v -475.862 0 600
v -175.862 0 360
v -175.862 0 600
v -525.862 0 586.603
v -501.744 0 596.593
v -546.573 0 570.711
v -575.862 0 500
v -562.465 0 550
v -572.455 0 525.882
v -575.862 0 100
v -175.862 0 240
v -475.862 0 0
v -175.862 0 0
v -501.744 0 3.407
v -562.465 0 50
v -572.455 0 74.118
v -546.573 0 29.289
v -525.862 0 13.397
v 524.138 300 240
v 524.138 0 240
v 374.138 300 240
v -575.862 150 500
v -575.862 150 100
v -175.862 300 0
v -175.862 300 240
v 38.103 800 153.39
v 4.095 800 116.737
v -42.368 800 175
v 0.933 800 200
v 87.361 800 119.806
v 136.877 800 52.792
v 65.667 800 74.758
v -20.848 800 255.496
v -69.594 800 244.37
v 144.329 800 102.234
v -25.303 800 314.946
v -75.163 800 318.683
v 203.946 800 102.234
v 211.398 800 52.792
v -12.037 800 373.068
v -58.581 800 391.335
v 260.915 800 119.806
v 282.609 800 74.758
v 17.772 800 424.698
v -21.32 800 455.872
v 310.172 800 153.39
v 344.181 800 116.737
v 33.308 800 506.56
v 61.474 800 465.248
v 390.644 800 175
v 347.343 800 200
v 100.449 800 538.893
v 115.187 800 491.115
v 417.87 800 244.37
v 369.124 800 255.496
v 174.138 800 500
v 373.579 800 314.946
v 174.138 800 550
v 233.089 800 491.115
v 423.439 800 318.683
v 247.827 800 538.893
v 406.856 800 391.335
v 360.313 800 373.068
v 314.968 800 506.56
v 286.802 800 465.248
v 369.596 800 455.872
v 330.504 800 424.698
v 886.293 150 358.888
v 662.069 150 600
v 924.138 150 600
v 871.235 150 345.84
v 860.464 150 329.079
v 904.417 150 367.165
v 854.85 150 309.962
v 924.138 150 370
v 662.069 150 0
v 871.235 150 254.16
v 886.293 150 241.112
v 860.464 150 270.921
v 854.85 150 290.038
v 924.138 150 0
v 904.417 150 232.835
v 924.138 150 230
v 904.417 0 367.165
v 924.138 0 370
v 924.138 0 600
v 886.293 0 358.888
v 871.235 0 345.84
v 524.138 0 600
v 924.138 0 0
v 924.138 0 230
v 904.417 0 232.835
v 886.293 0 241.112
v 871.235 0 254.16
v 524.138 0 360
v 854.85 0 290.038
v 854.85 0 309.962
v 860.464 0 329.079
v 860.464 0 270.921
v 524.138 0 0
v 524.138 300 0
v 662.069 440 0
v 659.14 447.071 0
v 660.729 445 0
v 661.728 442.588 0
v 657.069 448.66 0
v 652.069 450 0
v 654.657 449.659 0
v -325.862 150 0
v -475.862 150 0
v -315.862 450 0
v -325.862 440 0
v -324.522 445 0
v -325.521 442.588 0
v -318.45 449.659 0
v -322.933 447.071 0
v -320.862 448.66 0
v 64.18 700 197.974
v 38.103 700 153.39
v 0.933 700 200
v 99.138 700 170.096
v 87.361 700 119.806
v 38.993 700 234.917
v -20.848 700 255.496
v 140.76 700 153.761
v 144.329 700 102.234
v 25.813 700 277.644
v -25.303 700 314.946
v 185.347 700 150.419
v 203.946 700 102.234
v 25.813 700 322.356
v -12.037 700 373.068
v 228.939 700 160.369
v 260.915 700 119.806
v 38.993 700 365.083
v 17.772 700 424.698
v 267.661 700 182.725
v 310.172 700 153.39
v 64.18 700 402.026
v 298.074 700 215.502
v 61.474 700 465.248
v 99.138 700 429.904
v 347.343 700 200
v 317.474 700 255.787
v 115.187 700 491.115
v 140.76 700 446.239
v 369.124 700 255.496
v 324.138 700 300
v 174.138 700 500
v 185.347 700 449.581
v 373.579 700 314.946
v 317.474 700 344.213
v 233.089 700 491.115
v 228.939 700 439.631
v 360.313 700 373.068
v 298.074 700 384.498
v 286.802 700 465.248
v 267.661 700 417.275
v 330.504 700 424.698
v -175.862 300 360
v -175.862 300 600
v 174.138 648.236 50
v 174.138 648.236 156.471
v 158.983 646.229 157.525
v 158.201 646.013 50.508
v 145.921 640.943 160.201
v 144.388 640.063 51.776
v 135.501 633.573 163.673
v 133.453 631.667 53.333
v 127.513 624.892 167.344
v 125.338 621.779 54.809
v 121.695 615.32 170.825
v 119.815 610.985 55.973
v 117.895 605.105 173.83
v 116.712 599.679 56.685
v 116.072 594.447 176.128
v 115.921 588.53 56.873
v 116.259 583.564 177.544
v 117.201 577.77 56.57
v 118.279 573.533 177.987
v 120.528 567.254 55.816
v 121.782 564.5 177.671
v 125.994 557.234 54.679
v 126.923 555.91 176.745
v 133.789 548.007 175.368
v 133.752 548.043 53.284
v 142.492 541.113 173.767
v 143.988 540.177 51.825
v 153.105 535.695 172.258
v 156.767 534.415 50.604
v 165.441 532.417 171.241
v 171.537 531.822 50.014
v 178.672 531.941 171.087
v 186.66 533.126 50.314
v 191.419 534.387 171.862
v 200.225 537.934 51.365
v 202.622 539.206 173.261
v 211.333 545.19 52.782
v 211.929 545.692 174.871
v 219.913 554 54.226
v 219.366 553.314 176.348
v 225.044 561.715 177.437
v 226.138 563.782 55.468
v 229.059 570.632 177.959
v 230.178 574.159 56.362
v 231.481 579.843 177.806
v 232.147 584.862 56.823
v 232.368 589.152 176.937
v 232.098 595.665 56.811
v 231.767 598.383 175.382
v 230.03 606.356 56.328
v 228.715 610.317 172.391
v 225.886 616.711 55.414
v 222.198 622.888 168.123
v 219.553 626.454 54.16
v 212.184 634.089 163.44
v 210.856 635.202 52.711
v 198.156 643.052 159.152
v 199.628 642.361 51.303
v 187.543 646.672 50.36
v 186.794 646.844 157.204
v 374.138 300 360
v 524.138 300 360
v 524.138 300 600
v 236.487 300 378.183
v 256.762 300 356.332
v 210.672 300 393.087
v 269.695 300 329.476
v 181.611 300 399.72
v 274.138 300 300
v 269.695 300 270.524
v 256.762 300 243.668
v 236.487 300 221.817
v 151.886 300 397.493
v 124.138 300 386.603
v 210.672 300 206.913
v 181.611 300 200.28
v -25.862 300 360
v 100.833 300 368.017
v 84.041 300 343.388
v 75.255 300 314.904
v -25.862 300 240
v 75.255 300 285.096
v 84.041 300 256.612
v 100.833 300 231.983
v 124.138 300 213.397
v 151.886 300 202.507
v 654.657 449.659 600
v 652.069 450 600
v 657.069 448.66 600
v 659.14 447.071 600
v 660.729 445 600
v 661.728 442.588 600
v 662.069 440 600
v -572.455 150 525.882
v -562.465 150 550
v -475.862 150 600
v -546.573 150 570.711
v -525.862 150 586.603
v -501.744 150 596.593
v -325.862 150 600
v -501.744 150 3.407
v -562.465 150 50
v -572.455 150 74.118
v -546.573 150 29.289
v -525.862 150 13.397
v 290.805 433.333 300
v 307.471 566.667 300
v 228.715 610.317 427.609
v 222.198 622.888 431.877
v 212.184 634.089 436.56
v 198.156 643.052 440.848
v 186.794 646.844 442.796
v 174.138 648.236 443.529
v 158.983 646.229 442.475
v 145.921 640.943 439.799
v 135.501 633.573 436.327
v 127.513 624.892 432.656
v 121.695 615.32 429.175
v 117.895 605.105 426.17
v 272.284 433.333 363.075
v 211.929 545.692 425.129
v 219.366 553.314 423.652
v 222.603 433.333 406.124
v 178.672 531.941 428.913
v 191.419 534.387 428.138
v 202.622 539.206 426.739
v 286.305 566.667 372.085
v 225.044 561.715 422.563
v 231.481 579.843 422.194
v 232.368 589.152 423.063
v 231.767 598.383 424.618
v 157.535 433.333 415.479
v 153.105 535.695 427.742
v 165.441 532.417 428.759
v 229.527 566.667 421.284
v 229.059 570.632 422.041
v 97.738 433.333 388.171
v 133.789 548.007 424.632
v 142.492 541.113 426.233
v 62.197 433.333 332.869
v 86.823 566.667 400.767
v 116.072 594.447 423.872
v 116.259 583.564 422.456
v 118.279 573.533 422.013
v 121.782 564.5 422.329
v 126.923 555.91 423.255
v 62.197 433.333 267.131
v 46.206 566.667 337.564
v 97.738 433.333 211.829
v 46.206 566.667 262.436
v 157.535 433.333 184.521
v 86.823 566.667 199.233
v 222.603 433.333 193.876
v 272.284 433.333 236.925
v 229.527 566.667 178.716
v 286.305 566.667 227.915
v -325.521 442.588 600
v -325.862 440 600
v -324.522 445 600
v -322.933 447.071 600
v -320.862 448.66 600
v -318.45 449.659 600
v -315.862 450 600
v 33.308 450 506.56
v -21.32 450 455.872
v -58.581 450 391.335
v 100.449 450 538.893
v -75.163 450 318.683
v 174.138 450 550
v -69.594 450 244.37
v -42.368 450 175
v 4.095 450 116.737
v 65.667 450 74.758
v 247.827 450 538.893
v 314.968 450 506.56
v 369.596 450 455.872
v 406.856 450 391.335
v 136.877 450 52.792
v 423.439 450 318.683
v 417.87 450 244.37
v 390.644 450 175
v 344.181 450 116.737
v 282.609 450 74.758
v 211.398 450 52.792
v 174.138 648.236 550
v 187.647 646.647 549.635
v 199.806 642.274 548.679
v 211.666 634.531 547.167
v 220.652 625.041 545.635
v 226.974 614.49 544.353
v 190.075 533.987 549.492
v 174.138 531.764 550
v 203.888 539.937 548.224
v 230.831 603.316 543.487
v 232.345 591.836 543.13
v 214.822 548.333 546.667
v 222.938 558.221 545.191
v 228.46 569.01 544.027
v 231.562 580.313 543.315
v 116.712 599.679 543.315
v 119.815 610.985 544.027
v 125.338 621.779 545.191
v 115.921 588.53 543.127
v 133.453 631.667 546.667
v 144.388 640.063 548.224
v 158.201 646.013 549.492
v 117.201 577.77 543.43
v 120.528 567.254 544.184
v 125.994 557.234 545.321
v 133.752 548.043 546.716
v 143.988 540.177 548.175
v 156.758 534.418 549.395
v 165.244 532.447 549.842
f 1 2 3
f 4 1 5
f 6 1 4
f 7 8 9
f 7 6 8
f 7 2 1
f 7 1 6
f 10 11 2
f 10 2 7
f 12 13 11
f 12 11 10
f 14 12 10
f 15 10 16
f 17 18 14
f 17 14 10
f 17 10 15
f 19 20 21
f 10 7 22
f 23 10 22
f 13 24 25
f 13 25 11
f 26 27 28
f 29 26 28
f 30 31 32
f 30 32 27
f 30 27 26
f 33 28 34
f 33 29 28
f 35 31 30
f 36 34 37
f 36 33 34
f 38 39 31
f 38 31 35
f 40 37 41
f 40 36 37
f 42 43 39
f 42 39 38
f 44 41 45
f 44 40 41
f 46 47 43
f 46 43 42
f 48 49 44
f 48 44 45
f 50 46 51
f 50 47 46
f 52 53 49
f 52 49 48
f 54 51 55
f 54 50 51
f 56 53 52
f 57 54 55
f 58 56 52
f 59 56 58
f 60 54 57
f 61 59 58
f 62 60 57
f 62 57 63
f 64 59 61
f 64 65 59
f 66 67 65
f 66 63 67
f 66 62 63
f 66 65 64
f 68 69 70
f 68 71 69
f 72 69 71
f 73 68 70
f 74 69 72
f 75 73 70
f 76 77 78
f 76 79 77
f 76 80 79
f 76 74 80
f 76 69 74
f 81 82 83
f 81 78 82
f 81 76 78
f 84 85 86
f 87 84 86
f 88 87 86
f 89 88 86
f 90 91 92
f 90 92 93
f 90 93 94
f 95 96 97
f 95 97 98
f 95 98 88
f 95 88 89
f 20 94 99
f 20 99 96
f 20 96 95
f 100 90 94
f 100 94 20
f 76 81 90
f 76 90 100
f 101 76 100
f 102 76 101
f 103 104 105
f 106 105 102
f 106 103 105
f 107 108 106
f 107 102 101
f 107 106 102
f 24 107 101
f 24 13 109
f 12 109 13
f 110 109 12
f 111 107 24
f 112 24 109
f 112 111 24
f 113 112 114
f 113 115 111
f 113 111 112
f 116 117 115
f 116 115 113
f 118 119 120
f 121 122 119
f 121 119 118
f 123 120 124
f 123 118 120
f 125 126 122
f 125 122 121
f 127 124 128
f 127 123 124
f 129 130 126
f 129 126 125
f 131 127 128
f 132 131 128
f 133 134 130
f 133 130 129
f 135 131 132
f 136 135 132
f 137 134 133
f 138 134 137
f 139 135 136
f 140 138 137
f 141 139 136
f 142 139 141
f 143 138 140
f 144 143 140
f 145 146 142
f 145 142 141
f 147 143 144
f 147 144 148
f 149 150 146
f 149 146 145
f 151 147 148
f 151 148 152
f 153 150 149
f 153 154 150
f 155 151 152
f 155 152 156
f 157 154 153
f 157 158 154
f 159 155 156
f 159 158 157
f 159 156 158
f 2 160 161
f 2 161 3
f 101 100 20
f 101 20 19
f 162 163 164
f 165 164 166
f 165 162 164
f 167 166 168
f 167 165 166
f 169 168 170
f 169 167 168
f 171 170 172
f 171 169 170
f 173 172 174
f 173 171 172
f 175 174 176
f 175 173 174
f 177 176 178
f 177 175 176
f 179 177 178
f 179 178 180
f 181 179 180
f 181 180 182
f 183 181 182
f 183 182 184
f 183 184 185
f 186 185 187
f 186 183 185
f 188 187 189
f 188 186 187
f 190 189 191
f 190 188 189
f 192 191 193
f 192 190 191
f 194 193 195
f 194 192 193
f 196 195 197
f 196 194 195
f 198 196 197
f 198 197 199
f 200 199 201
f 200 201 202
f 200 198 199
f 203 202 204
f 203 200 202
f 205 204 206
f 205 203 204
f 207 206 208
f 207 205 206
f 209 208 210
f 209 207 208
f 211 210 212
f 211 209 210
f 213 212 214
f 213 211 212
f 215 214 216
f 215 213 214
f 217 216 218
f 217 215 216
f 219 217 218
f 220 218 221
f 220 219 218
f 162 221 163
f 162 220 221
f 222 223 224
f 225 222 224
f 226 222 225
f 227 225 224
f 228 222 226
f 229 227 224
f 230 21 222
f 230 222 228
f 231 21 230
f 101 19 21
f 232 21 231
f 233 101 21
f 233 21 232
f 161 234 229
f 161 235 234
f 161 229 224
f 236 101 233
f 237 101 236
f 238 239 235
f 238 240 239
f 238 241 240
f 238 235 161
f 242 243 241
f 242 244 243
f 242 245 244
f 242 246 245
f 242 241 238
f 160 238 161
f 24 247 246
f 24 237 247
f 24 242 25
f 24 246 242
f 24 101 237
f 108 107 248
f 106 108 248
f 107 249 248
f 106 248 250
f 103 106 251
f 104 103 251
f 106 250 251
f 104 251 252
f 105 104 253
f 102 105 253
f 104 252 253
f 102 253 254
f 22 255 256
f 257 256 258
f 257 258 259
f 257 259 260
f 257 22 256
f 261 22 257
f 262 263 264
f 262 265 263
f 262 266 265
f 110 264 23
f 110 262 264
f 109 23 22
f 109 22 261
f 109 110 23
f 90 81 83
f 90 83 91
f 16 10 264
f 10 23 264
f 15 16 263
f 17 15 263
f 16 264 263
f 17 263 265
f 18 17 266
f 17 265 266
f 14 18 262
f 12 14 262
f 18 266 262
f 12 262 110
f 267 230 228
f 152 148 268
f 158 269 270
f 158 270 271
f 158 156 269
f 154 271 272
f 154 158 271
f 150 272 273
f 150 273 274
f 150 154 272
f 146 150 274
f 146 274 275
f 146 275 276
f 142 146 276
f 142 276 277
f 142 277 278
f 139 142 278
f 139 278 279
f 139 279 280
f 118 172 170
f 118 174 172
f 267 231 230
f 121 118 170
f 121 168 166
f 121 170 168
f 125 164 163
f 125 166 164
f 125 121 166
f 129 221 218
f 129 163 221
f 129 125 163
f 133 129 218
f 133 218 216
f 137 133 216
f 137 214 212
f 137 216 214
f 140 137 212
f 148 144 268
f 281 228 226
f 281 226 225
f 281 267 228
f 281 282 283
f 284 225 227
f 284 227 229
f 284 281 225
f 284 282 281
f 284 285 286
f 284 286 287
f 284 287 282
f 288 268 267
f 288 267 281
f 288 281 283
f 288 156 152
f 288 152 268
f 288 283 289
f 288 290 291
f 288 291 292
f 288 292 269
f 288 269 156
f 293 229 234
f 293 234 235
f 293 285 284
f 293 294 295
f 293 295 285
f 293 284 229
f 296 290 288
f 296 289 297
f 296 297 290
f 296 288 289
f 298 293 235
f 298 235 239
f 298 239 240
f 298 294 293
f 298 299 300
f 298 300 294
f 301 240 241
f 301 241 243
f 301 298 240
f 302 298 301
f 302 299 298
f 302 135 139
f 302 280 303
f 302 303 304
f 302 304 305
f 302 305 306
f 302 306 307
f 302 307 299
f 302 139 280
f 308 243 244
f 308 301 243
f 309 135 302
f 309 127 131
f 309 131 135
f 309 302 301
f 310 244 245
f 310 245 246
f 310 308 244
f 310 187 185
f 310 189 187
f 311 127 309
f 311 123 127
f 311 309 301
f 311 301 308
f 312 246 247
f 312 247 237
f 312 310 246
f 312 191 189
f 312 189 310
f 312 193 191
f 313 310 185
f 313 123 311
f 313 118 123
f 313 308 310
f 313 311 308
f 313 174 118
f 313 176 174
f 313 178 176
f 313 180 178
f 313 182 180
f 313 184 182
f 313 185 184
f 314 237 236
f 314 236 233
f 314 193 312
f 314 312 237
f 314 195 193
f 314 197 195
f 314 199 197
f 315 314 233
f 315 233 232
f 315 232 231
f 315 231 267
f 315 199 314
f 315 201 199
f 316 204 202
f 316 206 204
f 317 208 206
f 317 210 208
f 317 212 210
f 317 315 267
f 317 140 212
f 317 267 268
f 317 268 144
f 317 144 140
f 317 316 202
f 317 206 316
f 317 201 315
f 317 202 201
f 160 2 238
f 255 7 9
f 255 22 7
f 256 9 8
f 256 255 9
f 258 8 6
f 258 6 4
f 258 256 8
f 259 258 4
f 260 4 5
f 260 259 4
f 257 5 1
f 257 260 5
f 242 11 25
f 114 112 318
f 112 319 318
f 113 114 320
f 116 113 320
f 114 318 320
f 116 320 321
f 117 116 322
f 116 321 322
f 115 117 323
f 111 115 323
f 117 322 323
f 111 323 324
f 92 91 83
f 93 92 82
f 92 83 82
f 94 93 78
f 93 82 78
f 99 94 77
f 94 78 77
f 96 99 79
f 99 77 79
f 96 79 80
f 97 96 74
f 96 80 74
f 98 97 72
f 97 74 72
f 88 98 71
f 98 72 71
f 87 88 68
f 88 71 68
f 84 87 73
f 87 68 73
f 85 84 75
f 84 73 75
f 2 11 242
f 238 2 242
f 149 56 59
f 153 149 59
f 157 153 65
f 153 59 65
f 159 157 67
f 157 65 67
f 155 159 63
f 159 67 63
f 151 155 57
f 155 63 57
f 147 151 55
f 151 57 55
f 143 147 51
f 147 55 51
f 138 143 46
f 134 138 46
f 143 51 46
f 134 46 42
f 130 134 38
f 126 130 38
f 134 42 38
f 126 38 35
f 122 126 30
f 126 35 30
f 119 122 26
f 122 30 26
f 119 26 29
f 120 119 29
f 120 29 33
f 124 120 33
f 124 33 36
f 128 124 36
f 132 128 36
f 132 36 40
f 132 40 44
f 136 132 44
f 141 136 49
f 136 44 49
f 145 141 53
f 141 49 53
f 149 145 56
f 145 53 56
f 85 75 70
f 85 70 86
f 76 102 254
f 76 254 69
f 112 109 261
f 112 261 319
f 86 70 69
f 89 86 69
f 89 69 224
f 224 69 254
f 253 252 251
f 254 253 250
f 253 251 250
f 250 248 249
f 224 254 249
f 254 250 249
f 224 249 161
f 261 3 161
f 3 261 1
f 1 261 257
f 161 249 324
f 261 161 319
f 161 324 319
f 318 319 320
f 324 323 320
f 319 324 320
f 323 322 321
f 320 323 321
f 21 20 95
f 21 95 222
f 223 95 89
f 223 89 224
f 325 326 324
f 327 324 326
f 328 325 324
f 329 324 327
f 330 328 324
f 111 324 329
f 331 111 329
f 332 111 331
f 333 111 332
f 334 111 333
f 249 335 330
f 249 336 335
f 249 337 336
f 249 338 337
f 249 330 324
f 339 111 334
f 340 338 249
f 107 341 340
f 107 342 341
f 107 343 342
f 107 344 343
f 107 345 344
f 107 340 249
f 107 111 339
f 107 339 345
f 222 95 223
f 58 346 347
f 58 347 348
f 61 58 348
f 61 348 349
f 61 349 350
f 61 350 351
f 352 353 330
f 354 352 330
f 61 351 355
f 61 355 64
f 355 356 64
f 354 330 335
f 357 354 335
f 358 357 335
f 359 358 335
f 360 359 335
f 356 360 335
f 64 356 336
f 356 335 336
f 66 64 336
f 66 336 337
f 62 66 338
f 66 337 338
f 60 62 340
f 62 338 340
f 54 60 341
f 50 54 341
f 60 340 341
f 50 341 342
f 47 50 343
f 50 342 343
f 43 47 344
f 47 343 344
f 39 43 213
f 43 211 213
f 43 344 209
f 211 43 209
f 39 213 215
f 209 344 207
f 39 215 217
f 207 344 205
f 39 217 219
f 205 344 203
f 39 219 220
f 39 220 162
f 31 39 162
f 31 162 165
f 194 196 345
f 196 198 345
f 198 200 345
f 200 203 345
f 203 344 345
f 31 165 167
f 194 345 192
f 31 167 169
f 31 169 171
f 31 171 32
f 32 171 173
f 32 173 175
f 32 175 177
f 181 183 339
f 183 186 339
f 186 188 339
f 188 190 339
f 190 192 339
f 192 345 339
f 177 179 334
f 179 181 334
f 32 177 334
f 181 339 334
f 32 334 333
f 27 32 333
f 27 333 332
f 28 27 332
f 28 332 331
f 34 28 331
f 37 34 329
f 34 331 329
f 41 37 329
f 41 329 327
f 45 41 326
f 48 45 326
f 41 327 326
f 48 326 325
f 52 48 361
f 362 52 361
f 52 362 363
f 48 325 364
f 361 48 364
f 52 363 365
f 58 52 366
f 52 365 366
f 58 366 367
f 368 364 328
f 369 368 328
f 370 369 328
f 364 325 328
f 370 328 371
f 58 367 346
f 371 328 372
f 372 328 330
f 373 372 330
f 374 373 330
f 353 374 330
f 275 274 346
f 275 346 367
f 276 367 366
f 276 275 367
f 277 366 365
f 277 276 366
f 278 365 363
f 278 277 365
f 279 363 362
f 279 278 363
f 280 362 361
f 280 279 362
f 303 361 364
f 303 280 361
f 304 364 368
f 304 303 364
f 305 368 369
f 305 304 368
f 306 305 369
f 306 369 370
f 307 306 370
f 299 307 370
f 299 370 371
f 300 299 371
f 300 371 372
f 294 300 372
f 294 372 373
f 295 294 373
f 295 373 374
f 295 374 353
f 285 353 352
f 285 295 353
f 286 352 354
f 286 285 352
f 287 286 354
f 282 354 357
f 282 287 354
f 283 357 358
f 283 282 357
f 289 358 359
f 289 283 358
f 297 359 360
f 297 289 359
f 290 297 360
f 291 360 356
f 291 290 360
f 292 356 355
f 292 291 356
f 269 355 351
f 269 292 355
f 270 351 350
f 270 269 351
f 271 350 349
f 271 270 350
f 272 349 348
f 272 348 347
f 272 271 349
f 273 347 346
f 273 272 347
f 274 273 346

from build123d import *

# Parameters (mm, degrees)
BOSS_EXTRUDE1_DEPTH     = 600
SKETCH2_R               = 250
BOSS_EXTRUDE3_DEPTH     = 350
SKETCH6_R               = 200
CUT_EXTRUDE1_DEPTH      = 100
SKETCH8_R               = 100
SKETCH7_R               = 150
FILLET2_R               = 100
FILLET3_R               = 10
SKETCH11_R              = 58.235787107
CUT_EXTRUDE5_DEPTH      = 1362.628038628
CUT_EXTRUDE5_DEPTH_BACK = 1362.628038628
CUT_EXTRUDE6_REACH      = 1281.27
SKETCH12_R              = 70
RIB1_REACH              = 1260.583
SKETCH13_WALL_W         = 2854.575996278
SKETCH13_WALL_H         = 120
RIB2_REACH              = 1260.583
SKETCH14_WALL_W         = 2854.575996278
SKETCH14_WALL_H         = 120


with BuildPart() as part:
    # Sketch1 → Boss-Extrude1 (new body)
    with BuildSketch(Plane.XY):
        Polygon((-175.862068966, 0), (-575.862068966, 0), (-575.862068966, 150), (-325.862068966, 150), (-325.862068966, 450), (662.068965517, 450), (662.068965517, 150), (924.137931034, 150), (924.137931034, 0), (524.137931034, 0), (524.137931034, 300), (-175.862068966, 300), align=None)
    extrude(amount=BOSS_EXTRUDE1_DEPTH)

    # Sketch2 → Boss-Extrude3 (add)
    with BuildSketch(Plane(origin=(0, 450, 0), x_dir=(1, 0, 0), z_dir=(0, 1, 0))):
        with Locations(Location((174.137931034, -300, 0), (0, 0, 270))):
            Circle(SKETCH2_R)
    extrude(amount=BOSS_EXTRUDE3_DEPTH)

    # Sketch6 → Cut-Extrude1 (cut)
    with BuildSketch(Plane(origin=(0, 800, 0), x_dir=(1, 0, 0), z_dir=(0, 1, 0))):
        with Locations(Location((174.137931034, -300, 0), (0, 0, 270))):
            Circle(SKETCH6_R)
    extrude(amount=-CUT_EXTRUDE1_DEPTH, mode=Mode.SUBTRACT)

    # Sketch8 → Cut-Loft1 section 0
    with BuildSketch(Plane.XZ.offset(-300)):
        with Locations((174.137931034, 300)):
            Circle(SKETCH8_R)
    # Sketch7 → Cut-Loft1 section 1
    with BuildSketch(Plane(origin=(0, 700, 0), x_dir=(1, 0, 0), z_dir=(0, 1, 0))):
        with Locations((174.137931034, -300)):
            Circle(SKETCH7_R)
    loft(mode=Mode.SUBTRACT)

    # Fillet2
    fillet2_edges = [part.edges().sort_by_distance(p)[0] for p in [
        (-575.862068966, 75, 0),
        (-575.862068966, 75, 600),
    ]]
    fillet(fillet2_edges, radius=FILLET2_R)

    # Fillet3
    fillet3_edges = [part.edges().sort_by_distance(p)[0] for p in [
        (-325.862068966, 450, 300),
        (662.068965517, 450, 300),
    ]]
    fillet(fillet3_edges, radius=FILLET3_R)

    # Sketch11 → Cut-Extrude5 (cut, two sides)
    with BuildSketch(Plane.XY) as cut_extrude5_sk:
        with Locations(Location((174.137931034, 590, 0), (0, 0, 90.000000003))):
            Circle(SKETCH11_R)
    extrude(amount=CUT_EXTRUDE5_DEPTH, mode=Mode.SUBTRACT)
    extrude(cut_extrude5_sk.sketch, amount=-CUT_EXTRUDE5_DEPTH_BACK, mode=Mode.SUBTRACT)

    # Sketch12 → Cut-Extrude6 (cut, up to next)
    with BuildSketch(Plane(origin=(0, 150, 0), x_dir=(1, 0, 0), z_dir=(0, 1, 0)), mode=Mode.PRIVATE) as cut_extrude6_sk1:
        with Locations((924.137931034, -300)):
            Circle(SKETCH12_R)
    cut_extrude6_tool1 = extrude(cut_extrude6_sk1.sketch, amount=-CUT_EXTRUDE6_REACH, mode=Mode.PRIVATE) & part.part
    add(cut_extrude6_tool1.solids().sort_by_distance((924.137931, 150, 300))[0], mode=Mode.SUBTRACT)

    # Sketch13 wall → Rib1 (add, up to next)
    with BuildSketch(Plane(origin=(-100.862068966, 150, 300), x_dir=(0.4472135955, 0.894427191, 0), z_dir=(-0.894427191, 0.4472135955, 0)), mode=Mode.PRIVATE) as rib1_sk1:
        Rectangle(SKETCH13_WALL_W, SKETCH13_WALL_H)
    rib1_tool1 = extrude(rib1_sk1.sketch, amount=RIB1_REACH, mode=Mode.PRIVATE) - part.part
    add(rib1_tool1.solids().sort_by_distance((-100.862068966, 150, 300))[0])

    # Sketch14 wall → Rib2 (add, up to next)
    with BuildSketch(Plane(origin=(449.137931034, 150, 300), x_dir=(-0.4472135955, 0.894427191, 0), z_dir=(-0.894427191, -0.4472135955, 0)), mode=Mode.PRIVATE) as rib2_sk1:
        Rectangle(SKETCH14_WALL_W, SKETCH14_WALL_H)
    rib2_tool1 = extrude(rib2_sk1.sketch, amount=-RIB2_REACH, mode=Mode.PRIVATE) - part.part
    add(rib2_tool1.solids().sort_by_distance((449.137931034, 150, 300))[0])


solid = part.part
